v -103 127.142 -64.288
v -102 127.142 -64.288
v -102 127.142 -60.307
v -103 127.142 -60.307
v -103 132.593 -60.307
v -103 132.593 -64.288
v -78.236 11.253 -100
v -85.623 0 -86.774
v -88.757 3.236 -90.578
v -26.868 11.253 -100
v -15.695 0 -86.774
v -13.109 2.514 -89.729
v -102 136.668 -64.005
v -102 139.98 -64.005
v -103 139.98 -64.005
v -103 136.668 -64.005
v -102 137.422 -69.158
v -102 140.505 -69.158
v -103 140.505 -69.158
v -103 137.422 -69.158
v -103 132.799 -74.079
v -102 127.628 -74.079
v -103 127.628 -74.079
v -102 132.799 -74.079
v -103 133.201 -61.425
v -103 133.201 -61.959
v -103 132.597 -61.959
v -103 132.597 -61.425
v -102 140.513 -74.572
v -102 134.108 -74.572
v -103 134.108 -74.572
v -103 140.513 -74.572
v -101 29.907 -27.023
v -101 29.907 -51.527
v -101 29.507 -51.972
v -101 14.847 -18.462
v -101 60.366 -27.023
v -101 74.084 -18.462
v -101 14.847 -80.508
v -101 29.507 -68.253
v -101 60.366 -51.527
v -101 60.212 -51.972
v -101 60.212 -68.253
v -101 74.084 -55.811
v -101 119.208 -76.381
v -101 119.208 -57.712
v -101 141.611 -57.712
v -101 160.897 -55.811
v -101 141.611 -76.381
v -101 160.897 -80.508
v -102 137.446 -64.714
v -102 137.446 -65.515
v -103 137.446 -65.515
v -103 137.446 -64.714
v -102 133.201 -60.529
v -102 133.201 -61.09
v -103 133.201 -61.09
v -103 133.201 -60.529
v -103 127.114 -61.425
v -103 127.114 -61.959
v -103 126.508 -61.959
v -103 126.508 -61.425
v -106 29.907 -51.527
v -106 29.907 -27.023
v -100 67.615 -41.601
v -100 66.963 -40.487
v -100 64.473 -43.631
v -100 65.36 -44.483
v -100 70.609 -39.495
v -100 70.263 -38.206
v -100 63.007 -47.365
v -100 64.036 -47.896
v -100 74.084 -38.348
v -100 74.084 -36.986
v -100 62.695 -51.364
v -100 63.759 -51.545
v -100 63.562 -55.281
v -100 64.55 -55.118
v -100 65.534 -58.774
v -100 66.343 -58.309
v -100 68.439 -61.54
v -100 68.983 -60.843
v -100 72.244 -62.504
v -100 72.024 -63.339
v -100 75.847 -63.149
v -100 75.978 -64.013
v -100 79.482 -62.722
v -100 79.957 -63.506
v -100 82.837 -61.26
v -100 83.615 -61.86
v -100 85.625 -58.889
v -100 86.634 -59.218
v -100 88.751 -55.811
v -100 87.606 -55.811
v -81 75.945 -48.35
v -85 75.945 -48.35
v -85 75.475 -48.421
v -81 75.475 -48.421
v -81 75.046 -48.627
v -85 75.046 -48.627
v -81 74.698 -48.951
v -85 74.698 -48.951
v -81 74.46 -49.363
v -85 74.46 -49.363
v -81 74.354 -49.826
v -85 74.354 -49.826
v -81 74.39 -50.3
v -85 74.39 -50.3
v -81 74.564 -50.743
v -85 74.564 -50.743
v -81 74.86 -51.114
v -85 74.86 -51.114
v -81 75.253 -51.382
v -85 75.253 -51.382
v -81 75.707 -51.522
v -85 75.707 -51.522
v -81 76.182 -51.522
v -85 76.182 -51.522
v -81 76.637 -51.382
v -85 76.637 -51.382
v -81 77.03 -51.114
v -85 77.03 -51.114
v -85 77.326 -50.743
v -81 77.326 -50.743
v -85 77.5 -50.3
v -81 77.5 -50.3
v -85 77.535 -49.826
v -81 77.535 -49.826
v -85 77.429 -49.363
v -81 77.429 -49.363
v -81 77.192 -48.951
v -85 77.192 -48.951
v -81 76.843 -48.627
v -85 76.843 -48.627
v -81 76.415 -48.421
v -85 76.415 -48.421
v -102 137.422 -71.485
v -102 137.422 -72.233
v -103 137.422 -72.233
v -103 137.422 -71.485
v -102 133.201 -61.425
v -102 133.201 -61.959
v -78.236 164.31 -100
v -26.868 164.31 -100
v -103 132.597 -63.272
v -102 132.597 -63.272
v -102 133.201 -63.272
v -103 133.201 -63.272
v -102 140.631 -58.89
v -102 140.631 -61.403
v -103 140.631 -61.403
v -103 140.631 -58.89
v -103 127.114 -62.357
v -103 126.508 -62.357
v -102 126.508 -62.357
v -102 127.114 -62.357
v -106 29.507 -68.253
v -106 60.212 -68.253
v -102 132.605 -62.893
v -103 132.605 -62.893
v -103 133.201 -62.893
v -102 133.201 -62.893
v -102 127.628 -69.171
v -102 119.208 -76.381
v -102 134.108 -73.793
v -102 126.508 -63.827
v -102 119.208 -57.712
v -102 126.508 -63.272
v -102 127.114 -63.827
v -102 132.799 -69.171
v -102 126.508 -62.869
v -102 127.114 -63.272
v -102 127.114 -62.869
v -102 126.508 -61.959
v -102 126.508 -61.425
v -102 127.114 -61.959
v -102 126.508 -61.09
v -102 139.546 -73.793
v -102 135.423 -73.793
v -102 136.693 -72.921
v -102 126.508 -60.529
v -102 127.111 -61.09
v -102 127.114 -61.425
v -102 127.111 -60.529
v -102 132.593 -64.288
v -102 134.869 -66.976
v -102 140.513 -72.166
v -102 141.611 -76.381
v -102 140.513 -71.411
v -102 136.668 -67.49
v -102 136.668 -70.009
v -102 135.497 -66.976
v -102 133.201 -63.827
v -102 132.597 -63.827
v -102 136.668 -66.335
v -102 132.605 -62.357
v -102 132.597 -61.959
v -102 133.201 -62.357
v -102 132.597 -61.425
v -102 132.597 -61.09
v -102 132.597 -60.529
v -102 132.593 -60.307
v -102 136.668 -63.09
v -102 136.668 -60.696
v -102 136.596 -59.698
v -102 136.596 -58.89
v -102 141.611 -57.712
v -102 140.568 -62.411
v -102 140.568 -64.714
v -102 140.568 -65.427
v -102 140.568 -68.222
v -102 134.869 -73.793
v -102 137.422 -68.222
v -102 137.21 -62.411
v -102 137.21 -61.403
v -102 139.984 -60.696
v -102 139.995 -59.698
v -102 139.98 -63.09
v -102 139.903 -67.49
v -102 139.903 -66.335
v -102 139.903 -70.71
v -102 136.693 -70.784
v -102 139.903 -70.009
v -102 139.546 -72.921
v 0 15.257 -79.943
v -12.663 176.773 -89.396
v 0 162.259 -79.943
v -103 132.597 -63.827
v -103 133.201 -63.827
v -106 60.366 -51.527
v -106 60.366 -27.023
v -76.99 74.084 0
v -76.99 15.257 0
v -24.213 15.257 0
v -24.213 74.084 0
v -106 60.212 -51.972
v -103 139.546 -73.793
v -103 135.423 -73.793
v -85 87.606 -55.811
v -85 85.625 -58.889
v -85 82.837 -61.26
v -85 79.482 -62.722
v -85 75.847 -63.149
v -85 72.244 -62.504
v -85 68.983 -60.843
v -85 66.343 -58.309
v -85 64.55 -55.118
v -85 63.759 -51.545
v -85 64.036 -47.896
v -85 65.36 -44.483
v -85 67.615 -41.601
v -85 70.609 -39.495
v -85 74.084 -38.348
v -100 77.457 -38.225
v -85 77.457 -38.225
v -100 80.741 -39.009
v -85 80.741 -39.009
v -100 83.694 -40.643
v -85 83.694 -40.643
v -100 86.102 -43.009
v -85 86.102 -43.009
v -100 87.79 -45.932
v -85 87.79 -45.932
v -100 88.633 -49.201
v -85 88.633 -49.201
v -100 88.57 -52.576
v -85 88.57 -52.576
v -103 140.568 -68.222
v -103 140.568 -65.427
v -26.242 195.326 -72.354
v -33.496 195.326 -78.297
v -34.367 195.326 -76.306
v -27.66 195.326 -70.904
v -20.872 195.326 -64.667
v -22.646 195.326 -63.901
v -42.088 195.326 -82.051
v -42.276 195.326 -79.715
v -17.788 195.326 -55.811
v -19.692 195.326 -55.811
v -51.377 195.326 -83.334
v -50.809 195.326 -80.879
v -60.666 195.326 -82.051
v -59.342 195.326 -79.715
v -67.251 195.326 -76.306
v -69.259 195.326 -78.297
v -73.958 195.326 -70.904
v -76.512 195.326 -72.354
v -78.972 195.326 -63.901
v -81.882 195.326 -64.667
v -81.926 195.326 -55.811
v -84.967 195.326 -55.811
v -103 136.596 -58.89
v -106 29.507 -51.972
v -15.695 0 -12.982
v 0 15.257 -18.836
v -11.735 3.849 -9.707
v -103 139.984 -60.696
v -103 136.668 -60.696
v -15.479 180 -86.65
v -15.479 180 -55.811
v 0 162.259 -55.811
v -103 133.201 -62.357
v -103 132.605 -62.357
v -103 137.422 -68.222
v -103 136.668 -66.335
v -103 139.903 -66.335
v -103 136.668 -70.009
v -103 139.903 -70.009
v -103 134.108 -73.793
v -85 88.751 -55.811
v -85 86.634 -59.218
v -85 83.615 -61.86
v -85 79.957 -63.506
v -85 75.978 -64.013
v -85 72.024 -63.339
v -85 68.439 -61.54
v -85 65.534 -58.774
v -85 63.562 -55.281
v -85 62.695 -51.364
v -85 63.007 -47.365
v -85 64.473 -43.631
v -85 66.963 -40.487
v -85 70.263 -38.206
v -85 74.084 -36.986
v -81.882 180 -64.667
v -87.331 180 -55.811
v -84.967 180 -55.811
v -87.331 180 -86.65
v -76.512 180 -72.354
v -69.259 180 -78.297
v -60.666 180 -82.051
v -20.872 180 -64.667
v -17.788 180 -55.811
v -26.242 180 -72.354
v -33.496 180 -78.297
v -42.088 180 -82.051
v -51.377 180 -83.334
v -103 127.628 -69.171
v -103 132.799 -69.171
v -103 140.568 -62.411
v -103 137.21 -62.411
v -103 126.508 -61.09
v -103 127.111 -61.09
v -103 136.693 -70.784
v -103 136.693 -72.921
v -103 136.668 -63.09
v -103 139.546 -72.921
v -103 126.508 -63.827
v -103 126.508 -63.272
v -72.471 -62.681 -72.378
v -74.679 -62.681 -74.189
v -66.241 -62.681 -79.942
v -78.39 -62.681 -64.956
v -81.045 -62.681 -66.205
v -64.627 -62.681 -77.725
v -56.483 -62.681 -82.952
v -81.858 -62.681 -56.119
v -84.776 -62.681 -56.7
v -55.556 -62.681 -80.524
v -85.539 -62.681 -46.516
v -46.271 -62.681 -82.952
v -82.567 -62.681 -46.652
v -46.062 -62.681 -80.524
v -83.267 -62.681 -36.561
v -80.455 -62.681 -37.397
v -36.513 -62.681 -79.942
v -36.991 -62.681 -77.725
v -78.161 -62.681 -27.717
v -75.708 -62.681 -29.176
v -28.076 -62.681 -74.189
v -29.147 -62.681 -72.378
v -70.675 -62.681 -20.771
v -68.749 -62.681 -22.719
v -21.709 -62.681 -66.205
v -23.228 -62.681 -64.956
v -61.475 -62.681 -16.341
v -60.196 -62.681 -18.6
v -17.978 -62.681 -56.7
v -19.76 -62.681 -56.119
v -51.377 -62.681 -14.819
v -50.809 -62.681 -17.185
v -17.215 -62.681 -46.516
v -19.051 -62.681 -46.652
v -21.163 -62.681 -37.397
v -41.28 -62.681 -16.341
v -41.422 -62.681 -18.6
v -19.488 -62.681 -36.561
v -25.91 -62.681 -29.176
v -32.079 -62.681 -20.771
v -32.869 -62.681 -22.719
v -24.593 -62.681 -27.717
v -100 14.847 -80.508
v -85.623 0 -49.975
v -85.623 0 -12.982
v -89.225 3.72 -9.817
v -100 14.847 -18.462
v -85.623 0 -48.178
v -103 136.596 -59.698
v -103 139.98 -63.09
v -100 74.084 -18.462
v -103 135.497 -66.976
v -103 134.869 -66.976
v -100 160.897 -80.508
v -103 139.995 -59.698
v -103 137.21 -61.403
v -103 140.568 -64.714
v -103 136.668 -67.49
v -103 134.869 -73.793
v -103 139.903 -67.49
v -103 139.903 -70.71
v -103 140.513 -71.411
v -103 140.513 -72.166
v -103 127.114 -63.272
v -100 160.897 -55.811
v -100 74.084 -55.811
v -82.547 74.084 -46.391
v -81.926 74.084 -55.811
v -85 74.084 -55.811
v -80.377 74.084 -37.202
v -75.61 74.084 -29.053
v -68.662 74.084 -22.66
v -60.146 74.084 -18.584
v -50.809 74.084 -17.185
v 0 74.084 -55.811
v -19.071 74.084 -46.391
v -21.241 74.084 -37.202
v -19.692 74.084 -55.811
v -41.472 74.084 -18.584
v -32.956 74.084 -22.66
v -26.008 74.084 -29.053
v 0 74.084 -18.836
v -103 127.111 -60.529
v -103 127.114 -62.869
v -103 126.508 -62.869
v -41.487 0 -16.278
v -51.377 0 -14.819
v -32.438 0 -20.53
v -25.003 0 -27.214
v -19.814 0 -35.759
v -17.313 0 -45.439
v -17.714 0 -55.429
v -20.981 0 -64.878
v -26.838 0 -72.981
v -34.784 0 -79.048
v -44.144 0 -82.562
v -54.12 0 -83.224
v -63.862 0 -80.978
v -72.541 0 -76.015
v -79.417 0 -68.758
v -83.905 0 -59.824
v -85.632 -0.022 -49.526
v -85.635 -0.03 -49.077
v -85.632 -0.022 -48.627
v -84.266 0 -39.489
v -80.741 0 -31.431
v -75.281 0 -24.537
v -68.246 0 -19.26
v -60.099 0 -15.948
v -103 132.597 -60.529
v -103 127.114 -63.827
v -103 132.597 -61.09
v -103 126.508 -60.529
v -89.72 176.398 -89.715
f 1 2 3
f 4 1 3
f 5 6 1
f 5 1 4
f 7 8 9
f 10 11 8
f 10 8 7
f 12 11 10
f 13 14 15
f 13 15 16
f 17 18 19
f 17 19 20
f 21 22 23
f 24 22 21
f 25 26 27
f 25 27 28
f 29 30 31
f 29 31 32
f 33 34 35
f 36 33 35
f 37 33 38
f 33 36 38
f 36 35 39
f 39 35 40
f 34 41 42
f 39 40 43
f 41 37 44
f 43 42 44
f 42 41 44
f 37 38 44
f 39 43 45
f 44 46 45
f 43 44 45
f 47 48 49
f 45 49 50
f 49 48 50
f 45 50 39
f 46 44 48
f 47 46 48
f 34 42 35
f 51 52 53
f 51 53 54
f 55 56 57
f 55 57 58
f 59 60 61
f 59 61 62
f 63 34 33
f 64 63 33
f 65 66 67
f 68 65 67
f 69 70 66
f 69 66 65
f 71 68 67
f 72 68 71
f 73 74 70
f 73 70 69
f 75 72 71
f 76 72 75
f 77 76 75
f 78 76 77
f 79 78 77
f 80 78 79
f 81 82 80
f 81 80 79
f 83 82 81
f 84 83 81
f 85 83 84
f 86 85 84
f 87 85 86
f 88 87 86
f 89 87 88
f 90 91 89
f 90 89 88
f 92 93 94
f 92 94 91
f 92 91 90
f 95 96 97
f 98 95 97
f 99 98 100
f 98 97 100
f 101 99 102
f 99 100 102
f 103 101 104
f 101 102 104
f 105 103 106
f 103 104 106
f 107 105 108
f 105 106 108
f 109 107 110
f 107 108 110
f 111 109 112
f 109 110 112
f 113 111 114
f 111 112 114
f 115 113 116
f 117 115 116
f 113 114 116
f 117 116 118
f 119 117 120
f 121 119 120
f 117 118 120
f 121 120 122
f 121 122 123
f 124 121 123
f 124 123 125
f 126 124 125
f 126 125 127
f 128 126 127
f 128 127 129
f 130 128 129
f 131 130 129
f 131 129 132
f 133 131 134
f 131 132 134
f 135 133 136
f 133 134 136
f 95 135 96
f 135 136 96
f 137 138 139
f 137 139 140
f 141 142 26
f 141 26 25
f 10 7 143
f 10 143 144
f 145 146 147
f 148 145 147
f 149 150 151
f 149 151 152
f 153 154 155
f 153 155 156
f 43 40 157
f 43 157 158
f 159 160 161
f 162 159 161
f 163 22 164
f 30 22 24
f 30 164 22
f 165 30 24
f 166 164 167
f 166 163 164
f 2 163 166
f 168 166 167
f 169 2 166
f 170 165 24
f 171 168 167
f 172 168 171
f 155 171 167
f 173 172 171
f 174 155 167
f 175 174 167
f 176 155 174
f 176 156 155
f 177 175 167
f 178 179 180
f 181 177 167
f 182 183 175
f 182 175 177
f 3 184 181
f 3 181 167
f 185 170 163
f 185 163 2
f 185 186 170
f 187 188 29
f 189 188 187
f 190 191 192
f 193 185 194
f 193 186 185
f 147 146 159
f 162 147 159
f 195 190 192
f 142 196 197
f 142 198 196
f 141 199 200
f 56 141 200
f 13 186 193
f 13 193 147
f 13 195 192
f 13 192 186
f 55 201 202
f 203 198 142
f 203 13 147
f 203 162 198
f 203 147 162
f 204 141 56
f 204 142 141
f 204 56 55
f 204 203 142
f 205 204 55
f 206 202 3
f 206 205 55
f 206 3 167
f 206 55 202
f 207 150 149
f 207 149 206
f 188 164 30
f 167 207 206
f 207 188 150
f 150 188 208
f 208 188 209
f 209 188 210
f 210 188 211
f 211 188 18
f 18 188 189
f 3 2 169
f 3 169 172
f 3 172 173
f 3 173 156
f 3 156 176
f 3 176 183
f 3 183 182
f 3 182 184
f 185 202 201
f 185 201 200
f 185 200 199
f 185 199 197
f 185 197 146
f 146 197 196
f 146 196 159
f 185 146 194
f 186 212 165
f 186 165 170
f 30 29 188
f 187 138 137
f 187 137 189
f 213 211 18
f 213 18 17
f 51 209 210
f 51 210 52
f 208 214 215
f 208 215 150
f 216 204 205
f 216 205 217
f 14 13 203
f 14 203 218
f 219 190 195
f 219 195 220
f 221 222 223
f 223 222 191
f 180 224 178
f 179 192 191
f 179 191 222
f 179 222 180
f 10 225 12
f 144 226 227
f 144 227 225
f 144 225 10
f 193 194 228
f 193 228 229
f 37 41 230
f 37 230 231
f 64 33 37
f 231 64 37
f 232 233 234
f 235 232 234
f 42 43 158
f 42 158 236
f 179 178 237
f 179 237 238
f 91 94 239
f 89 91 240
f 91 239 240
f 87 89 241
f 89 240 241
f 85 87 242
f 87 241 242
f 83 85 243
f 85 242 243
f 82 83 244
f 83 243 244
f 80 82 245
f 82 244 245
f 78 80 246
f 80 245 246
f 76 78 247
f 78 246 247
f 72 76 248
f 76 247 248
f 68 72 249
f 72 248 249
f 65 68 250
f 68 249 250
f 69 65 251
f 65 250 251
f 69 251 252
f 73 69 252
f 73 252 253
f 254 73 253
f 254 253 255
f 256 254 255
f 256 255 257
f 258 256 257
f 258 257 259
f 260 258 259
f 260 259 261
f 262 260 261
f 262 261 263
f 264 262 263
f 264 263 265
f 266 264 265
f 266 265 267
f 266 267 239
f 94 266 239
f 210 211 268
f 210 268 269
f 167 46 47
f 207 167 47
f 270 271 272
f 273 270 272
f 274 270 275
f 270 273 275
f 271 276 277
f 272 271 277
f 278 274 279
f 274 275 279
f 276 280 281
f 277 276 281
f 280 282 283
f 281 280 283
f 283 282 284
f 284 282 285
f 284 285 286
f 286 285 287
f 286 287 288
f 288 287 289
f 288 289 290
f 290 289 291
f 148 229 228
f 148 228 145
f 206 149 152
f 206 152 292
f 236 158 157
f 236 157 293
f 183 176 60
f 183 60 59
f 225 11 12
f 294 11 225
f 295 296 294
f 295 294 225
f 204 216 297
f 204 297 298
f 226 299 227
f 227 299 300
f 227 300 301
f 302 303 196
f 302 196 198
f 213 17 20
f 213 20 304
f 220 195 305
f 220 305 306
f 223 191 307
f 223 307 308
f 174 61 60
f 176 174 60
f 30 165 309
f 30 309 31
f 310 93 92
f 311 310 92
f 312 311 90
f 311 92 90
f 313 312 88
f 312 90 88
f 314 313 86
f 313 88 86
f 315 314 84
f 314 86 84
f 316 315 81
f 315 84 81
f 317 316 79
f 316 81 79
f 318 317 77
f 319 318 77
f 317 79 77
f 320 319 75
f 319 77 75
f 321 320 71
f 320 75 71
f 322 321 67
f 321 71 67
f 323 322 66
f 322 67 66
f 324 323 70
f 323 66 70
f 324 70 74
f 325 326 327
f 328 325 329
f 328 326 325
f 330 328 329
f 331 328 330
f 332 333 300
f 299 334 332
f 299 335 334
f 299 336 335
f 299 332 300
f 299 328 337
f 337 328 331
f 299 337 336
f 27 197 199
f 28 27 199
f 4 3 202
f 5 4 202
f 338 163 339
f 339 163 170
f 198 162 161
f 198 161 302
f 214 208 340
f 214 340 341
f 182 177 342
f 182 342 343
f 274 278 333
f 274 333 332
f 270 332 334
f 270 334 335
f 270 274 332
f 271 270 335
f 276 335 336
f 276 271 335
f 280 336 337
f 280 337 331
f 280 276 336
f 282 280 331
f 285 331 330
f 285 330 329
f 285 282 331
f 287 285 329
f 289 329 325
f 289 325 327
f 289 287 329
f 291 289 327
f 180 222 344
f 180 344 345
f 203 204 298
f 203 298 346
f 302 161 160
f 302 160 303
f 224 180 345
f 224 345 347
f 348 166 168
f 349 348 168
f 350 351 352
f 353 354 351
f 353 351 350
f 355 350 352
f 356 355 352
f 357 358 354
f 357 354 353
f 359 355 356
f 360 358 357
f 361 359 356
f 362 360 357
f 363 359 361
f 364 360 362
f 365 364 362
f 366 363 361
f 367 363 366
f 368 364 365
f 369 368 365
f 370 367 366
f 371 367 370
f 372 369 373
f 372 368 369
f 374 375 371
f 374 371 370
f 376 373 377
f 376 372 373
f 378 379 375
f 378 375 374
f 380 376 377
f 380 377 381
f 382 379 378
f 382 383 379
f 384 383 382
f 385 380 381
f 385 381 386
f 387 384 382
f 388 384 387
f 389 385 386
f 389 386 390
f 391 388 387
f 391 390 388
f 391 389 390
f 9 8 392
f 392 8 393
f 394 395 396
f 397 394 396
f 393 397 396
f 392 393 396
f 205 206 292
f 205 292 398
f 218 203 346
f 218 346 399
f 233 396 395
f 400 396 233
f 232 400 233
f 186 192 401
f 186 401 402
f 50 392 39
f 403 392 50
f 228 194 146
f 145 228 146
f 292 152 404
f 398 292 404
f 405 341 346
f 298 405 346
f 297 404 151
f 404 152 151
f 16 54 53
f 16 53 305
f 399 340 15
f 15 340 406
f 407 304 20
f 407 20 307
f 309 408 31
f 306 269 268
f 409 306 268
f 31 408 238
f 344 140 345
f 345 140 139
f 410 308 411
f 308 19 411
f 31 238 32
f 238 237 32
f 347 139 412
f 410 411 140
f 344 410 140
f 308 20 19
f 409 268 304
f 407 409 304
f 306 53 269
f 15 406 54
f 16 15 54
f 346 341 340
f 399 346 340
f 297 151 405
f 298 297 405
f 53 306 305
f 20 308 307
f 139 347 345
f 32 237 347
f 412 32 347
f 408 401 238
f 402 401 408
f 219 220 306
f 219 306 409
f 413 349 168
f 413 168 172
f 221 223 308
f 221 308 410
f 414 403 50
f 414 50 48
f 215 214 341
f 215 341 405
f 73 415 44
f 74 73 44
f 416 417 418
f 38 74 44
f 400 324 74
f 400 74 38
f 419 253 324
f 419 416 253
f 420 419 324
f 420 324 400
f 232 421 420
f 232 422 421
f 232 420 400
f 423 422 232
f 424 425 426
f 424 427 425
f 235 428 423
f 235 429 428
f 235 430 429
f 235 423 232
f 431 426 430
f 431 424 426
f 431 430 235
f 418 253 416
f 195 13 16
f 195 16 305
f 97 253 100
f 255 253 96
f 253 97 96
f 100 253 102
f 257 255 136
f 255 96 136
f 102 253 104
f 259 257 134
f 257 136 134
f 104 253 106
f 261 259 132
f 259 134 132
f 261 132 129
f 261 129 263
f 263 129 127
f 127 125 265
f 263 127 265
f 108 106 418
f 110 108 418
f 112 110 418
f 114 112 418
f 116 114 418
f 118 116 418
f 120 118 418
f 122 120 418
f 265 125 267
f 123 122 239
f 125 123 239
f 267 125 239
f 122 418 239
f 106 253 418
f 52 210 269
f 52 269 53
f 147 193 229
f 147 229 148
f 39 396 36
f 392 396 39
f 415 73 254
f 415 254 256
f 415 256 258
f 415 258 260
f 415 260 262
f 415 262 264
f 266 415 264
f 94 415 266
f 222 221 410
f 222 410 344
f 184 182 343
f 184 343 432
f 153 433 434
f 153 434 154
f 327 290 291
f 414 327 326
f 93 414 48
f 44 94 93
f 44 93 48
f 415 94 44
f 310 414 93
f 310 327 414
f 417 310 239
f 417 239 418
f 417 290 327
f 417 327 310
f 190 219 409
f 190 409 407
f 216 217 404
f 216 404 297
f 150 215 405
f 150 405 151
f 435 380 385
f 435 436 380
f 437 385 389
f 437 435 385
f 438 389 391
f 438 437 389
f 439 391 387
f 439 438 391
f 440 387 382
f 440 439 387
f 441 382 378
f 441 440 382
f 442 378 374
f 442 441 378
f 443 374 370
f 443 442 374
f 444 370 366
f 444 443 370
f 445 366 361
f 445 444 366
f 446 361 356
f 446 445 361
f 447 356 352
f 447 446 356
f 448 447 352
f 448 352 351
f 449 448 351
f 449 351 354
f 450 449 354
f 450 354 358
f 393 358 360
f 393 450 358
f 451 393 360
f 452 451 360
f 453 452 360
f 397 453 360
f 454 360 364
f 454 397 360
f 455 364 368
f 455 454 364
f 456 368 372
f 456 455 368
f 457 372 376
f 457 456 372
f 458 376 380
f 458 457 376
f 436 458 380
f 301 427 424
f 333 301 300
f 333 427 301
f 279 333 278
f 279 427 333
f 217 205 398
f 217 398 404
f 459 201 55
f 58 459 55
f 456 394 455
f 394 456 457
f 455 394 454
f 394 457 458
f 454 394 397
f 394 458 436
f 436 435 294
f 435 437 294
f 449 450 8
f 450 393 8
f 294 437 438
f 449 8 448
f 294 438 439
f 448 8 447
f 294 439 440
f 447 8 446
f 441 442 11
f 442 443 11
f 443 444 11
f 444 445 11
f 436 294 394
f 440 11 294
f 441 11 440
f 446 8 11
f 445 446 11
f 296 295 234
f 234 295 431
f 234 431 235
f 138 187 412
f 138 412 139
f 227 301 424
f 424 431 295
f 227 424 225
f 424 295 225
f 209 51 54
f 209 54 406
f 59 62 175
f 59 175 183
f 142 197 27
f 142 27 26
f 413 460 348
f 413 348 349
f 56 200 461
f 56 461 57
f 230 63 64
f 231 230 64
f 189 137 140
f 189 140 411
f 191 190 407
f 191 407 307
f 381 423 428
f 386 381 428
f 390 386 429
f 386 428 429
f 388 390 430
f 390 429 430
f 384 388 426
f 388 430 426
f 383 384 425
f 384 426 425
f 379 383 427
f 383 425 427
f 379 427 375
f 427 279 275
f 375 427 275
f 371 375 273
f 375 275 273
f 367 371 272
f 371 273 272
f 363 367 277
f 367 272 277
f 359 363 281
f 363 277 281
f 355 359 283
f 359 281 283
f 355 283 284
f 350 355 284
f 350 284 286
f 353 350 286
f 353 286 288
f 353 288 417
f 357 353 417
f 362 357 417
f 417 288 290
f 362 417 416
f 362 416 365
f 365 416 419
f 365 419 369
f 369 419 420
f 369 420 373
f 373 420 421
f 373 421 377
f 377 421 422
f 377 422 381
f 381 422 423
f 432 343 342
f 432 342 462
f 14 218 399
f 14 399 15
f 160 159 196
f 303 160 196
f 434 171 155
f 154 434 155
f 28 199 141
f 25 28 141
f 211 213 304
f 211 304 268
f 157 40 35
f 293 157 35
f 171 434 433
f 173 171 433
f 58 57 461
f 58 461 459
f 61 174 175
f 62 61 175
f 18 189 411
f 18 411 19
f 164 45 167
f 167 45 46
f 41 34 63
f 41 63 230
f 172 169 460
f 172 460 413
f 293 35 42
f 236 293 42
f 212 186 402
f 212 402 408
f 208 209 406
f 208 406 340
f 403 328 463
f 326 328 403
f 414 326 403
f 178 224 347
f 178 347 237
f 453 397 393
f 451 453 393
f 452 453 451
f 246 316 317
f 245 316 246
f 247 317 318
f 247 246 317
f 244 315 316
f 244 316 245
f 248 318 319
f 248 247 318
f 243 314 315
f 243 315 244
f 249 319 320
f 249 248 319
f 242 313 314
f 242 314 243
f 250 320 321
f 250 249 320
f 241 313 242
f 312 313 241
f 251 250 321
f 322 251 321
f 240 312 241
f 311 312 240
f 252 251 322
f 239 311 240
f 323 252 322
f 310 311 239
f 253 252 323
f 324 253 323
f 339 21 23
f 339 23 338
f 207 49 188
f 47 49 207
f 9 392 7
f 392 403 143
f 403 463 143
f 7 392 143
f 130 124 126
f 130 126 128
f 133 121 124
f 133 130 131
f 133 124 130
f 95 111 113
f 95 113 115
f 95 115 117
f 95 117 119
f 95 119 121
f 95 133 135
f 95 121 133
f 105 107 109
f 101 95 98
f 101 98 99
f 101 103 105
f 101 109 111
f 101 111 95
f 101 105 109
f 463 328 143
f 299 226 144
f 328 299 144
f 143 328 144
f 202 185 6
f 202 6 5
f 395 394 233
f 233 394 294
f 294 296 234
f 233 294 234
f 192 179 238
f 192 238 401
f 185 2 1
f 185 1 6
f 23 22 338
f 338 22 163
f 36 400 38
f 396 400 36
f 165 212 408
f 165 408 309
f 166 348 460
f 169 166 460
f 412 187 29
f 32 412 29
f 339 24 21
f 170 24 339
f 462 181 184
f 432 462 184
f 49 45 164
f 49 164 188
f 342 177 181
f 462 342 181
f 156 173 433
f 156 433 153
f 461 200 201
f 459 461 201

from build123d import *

# Parameters (mm, degrees)
SKETCH1_W            = 100
SKETCH1_H            = 100
BOSS_EXTRUDE1_DEPTH  = 180
SKETCH2_R            = 34.257790197
BOSS_EXTRUDE2_DEPTH  = 350
SKETCH3_W            = 152.006357392
SKETCH3_H            = 282.452416457
CUT_EXTRUDE2_DEPTH   = 400
CUT_EXTRUDE3_DEPTH   = 400
CUT_EXTRUDE4_DEPTH   = 400
CUT_EXTRUDE5_DEPTH   = 400
SKETCH7_W            = 160.159381639
SKETCH7_H            = 147.362276113
CUT_EXTRUDE6_DEPTH   = 400
SKETCH8_W            = 147.310744502
SKETCH8_H            = 162.038906966
CUT_EXTRUDE7_DEPTH   = 400
SKETCH9_R            = 31.847293423
CUT_EXTRUDE8_DEPTH   = 400
SKETCH10_W           = 140.220962397
SKETCH10_H           = 212.033531124
CUT_EXTRUDE9_DEPTH   = 400
SKETCH11_R           = 13.603137886
CUT_EXTRUDE11_DEPTH  = 15
SKETCH12_R           = 12.495422516
BOSS_EXTRUDE3_DEPTH  = 15
SKETCH13_R           = 1.594865099
BOSS_EXTRUDE4_DEPTH  = 4
SKETCH14_W           = 100.74862993
SKETCH14_H           = 110.555003588
CUT_EXTRUDE13_DEPTH  = 400
BOSS_EXTRUDE5_DEPTH  = 1
SKETCH16_W           = 24.504230724
SKETCH16_H           = 30.458347221
BOSS_EXTRUDE6_DEPTH  = 5
SKETCH17_W           = 18.669530869
SKETCH17_H           = 22.4027039
BOSS_EXTRUDE7_DEPTH  = 1
SKETCH18_W           = 4.907623399
SKETCH18_H           = 5.170746831
SKETCH18_W_2         = 3.981473695
SKETCH18_H_2         = 5.451349552
BOSS_EXTRUDE8_DEPTH  = 1
BOSS_EXTRUDE9_DEPTH  = 1
SKETCH21_W           = 16.281298494
SKETCH21_H           = 30.70477752
BOSS_EXTRUDE10_DEPTH = 5
SKETCH22_W           = 0.561666562
SKETCH22_H           = 0.603858724
SKETCH22_W_2         = 0.53443704
SKETCH22_W_3         = 0.536755884
SKETCH22_H_2         = 0.595744993
SKETCH22_W_4         = 0.555081497
SKETCH22_H_3         = 0.603543747
SKETCH22_H_4         = 0.606016701
SKETCH22_W_5         = 0.51195437
BOSS_EXTRUDE11_DEPTH = 1


with BuildPart() as part:
    # Sketch1 → Boss-Extrude1 (new body)
    with BuildSketch(Plane(origin=(0, 0, 0), x_dir=(1, 0, 0), z_dir=(0, 1, 0))):
        with Locations((-50, 50)):
            Rectangle(SKETCH1_W, SKETCH1_H)
    extrude(amount=BOSS_EXTRUDE1_DEPTH)

    # Sketch2 → Boss-Extrude2 (add, symmetric)
    with BuildSketch(Plane(origin=(0, 180, 0), x_dir=(1, 0, 0), z_dir=(0, 1, 0))):
        with Locations(Location((-51.377291833, 49.076536384, 0), (0, 0, 270))):
            Circle(SKETCH2_R)
    extrude(amount=BOSS_EXTRUDE2_DEPTH, both=True)

    # Sketch3 → Cut-Extrude2 (cut)
    with BuildSketch(Plane(origin=(0, 0, 0), x_dir=(0, 0, -1), z_dir=(1, 0, 0))):
        with Locations((57.419900112, 502.274302507)):
            Rectangle(SKETCH3_W, SKETCH3_H)
    extrude(amount=-CUT_EXTRUDE2_DEPTH, mode=Mode.SUBTRACT)

    # Sketch4 → Cut-Extrude3 (cut)
    with BuildSketch(Plane(origin=(0, 0, 0), x_dir=(0, 0, -1), z_dir=(1, 0, 0))):
        Polygon((12.981970869, 0), (-8.994244796, 25.828096003), (-18.564506014, -15.259465835), align=None)
        Polygon((85.072517936, -1.448103984), (109.237639161, 19.113145112), (115.920034239, -3.267382694), align=None)
        Polygon((12.981970869, 180), (-8.994244796, 148.537596011), (-15.418178585, 193.219274892), align=None)
        Polygon((85.072517936, 181.854312784), (103.841225373, 159.795920888), (106.132549481, 198.647393934), align=None)
    extrude(amount=-CUT_EXTRUDE3_DEPTH, mode=Mode.SUBTRACT)

    # Sketch5 → Cut-Extrude4 (cut)
    with BuildSketch(Plane.XY):
        Polygon((-85.623287335, 0), (-106.370377984, 21.426392531), (-122.288861874, 3.209259887), (-93.526345261, -19.884701759), align=None)
        Polygon((-15.694988751, 0), (0, 15.257385304), (12.122677088, 15.257385304), (10.563067769, -19.884701759), align=None)
        Polygon((-87.166490339, 180.248071029), (-106.370377984, 151.29108453), (-117.705469457, 200.501115102), align=None)
        Polygon((-15.694988751, 180.248071029), (7.833767065, 153.279557508), (0, 193.941208308), align=None)
    extrude(amount=-CUT_EXTRUDE4_DEPTH, mode=Mode.SUBTRACT)

    # Sketch6 → Cut-Extrude5 (cut)
    with BuildSketch(Plane(origin=(0, 180, 0), x_dir=(1, 0, 0), z_dir=(0, 1, 0))):
        Polygon((-112.386997555, 28.400400964), (-64.261264503, -10.212759359), (-84.406366528, -15.51192827), (-124.649689542, -15.51192827), align=None)
        Polygon((-97.065537028, 135.861756084), (-119.37552445, 77.792688888), (-118.043343626, 64.347606737), (-66.428694172, 110.575168787), align=None)
        Polygon((-24.69640689, -21.815840769), (11.092108798, -8.97361337), (17.428316417, 32.393768119), (-38.531576846, -11.139157378), align=None)
        Polygon((-17.445484601, 140.804394854), (35.417473102, 107.262520599), (9.305452855, 72.996438725), (-31.724385352, 103.625272537), align=None)
    extrude(amount=-CUT_EXTRUDE5_DEPTH, mode=Mode.SUBTRACT)

    # Sketch7 → Cut-Extrude6 (cut)
    with BuildSketch(Plane.XY):
        with Locations((-66.123258915, -136.36252694)):
            Rectangle(SKETCH7_W, SKETCH7_H)
    extrude(amount=-CUT_EXTRUDE6_DEPTH, mode=Mode.SUBTRACT)

    # Sketch8 → Cut-Extrude7 (cut)
    with BuildSketch(Plane.XY):
        with Locations((-53.541153336, 332.448287589)):
            Rectangle(SKETCH8_W, SKETCH8_H)
    extrude(amount=-CUT_EXTRUDE7_DEPTH, mode=Mode.SUBTRACT)

    # Sketch9 → Cut-Extrude8 (cut)
    with BuildSketch(Plane(origin=(0, 251.428834106, 0), x_dir=(1, 0, 0), z_dir=(0, 1, 0))):
        with Locations(Location((-50.808993157, 49.032036374, 0), (0, 0, 270))):
            Circle(SKETCH9_R)
    extrude(amount=-CUT_EXTRUDE8_DEPTH, mode=Mode.SUBTRACT)

    # Sketch10 → Cut-Extrude9 (cut)
    with BuildSketch(Plane.ZY.offset(100)):
        with Locations((14.299084536, 180.100625535)):
            Rectangle(SKETCH10_W, SKETCH10_H)
    extrude(amount=-CUT_EXTRUDE9_DEPTH, mode=Mode.SUBTRACT)

    # Sketch11 → Cut-Extrude11 (cut)
    with BuildSketch(Plane.ZY.offset(100)):
        with Locations((-50.413251954, 76.264646142)):
            Circle(SKETCH11_R)
    extrude(amount=-CUT_EXTRUDE11_DEPTH, mode=Mode.SUBTRACT)

    # Sketch12 → Boss-Extrude3 (add)
    with BuildSketch(Plane.ZY.offset(85)):
        with Locations(Location((-50.658800768, 76.222522328, 0), (0, 0, 114.353089558))):
            Circle(SKETCH12_R)
    extrude(amount=BOSS_EXTRUDE3_DEPTH)

    # Sketch13 → Boss-Extrude4 (add)
    with BuildSketch(Plane(origin=(-85, 0, 0), x_dir=(0, 0, -1), z_dir=(1, 0, 0))):
        with Locations(Location((49.945205578, 75.944780088, 0), (0, 0, 180))):
            Circle(SKETCH13_R)
    extrude(amount=BOSS_EXTRUDE4_DEPTH)

    # Sketch14 → Cut-Extrude13 (cut)
    with BuildSketch(Plane.ZY.offset(100)):
        with Locations((-65.350029467, 250.603414818)):
            Rectangle(SKETCH14_W, SKETCH14_H)
    extrude(amount=-CUT_EXTRUDE13_DEPTH, mode=Mode.SUBTRACT)

    # Sketch15 → Boss-Extrude5 (add)
    with BuildSketch(Plane.ZY.offset(100)):
        Polygon((-18.461827727, 14.847435435), (-80.507743362, 14.847435435), (-80.507743362, 160.896793159), (-55.811396663, 160.896793159), (-55.811396663, 74.083859973), (-18.461827727, 74.083859973), align=None)
    extrude(amount=BOSS_EXTRUDE5_DEPTH)

    # Sketch16 → Boss-Extrude6 (add)
    with BuildSketch(Plane.ZY.offset(101)):
        with Locations((-39.275145749, 45.136437142)):
            Rectangle(SKETCH16_W, SKETCH16_H)
    extrude(amount=BOSS_EXTRUDE6_DEPTH)

    # Sketch17 → Boss-Extrude7 (add)
    with BuildSketch(Plane.ZY.offset(101)):
        with Locations((-67.04663872, 130.409241603)):
            Rectangle(SKETCH17_W, SKETCH17_H)
    extrude(amount=BOSS_EXTRUDE7_DEPTH)

    # Sketch18 → Boss-Extrude8 (add)
    with BuildSketch(Plane.ZY.offset(102)):
        with Locations((-71.625108618, 130.213401885)):
            Rectangle(SKETCH18_W, SKETCH18_H)
        with Locations((-62.297675883, 129.867186512)):
            Rectangle(SKETCH18_W_2, SKETCH18_H_2)
    extrude(amount=BOSS_EXTRUDE8_DEPTH)

    # Sketch19 → Boss-Extrude9 (add)
    with BuildSketch(Plane.ZY.offset(102)):
        Polygon((-66.976455081, 134.868836652), (-73.7929295, 134.868836652), (-73.7929295, 134.108269479), (-74.571872104, 134.108269479), (-74.571872104, 140.512729543), (-73.7929295, 140.512729543), (-72.165965418, 140.512729543), (-72.233411796, 137.421948277), (-71.48458153, 137.421948277), (-71.410861795, 140.512729543), (-69.158339735, 140.504865112), (-69.158339735, 137.421948277), (-68.22174926, 137.421948277), (-68.22174926, 140.567922793), (-65.426885805, 140.567922793), (-65.515241968, 137.446210948), (-64.714122339, 137.446210948), (-64.714122339, 140.567922793), (-62.410871788, 140.567922793), (-62.410871788, 137.210126003), (-61.403493639, 137.210126003), (-61.403493639, 140.631129361), (-58.889974549, 140.631129361), (-58.889974549, 136.595539338), (-59.698319644, 136.595539338), (-59.698319644, 139.99489006), (-60.695848378, 139.984078324), (-60.695848378, 136.667717235), (-63.090112056, 136.667717235), (-63.090112056, 139.979723883), (-64.00479018, 139.979723883), (-64.00479018, 136.667717235), (-66.334605538, 136.667717235), (-66.334605538, 139.902697072), (-67.48995239, 139.902697072), (-67.48995239, 136.667717235), (-70.008746759, 136.667717235), (-70.008746759, 139.902697072), (-70.709698815, 139.902697072), (-70.783897489, 136.693128041), (-72.921241048, 136.693128041), (-72.921241048, 139.545601992), (-73.7929295, 139.545601992), (-73.7929295, 135.423339258), (-66.976455081, 135.49721976), align=None)
    extrude(amount=BOSS_EXTRUDE9_DEPTH)

    # Sketch21 → Boss-Extrude10 (add)
    with BuildSketch(Plane.ZY.offset(101)):
        with Locations((-60.112791098, 44.859291254)):
            Rectangle(SKETCH21_W, SKETCH21_H)
    extrude(amount=BOSS_EXTRUDE10_DEPTH)

    # Sketch22 → Boss-Extrude11 (add)
    with BuildSketch(Plane.ZY.offset(102)):
        with Locations((-60.80943011, 132.899150377)):
            Rectangle(SKETCH22_W, SKETCH22_H)
        with Locations((-61.69225831, 132.899150377)):
            Rectangle(SKETCH22_W_2, SKETCH22_H)
        with Locations((-62.62493976, 132.903207243)):
            Rectangle(SKETCH22_W_3, SKETCH22_H_2)
        with Locations((-63.54978292, 132.899150377)):
            Rectangle(SKETCH22_W_4, SKETCH22_H)
        with Locations((-60.80943011, 126.809637752)):
            Rectangle(SKETCH22_W, SKETCH22_H_3)
        with Locations((-61.69225831, 126.810874229)):
            Rectangle(SKETCH22_W_2, SKETCH22_H_4)
        with Locations((-62.612539003, 126.810874229)):
            Rectangle(SKETCH22_W_5, SKETCH22_H_4)
        with Locations((-63.54978292, 126.810874229)):
            Rectangle(SKETCH22_W_4, SKETCH22_H_4)
    extrude(amount=BOSS_EXTRUDE11_DEPTH)


solid = part.part
